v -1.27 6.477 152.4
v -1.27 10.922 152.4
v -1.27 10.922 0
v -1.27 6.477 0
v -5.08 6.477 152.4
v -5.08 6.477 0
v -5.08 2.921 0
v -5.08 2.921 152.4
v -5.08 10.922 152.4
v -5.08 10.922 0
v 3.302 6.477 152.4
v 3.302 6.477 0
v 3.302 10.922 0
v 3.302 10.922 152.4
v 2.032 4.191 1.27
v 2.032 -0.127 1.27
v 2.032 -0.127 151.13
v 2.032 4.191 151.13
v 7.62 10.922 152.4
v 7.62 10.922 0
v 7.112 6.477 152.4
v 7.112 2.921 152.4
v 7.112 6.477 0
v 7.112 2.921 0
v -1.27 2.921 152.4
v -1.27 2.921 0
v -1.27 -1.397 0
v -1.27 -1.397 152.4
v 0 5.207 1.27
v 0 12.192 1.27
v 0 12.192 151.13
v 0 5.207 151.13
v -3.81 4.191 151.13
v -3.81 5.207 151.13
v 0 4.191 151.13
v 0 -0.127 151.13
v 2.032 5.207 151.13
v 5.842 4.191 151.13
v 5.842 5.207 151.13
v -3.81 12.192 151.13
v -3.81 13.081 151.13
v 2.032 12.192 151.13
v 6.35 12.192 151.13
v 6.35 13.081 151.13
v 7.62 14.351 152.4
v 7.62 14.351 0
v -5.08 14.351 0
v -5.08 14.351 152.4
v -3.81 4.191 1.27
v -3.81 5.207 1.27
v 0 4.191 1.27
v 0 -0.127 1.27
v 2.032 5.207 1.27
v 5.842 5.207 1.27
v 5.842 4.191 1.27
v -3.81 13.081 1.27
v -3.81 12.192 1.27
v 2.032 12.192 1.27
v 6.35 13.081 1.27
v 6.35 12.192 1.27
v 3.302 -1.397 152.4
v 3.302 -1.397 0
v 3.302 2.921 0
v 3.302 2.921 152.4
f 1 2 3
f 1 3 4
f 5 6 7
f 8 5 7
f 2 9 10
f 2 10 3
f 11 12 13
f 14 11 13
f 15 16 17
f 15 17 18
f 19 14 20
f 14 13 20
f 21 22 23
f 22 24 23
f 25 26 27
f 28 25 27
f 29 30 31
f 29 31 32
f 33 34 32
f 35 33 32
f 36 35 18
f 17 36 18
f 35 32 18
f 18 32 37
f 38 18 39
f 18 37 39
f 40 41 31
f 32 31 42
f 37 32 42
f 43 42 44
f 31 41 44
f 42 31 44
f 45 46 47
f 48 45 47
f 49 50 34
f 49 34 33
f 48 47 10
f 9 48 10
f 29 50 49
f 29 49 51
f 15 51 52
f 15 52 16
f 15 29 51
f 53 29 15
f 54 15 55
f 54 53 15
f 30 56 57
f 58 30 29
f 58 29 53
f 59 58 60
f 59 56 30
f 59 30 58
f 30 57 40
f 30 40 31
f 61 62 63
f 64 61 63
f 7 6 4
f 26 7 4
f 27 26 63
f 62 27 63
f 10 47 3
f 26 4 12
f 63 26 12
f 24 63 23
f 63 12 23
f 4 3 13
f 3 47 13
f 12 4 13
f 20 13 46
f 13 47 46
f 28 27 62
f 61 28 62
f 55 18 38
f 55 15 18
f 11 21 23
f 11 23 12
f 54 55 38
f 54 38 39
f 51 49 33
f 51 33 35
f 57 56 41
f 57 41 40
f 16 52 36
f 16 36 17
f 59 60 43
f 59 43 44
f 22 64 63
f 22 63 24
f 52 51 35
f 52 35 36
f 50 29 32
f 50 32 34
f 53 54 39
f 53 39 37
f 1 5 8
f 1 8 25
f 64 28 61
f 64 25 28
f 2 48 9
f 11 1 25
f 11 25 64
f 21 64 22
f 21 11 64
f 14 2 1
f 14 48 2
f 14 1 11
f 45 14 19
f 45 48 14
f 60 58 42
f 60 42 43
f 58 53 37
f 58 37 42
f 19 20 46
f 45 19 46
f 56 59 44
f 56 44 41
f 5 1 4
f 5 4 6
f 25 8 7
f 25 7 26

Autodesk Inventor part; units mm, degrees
ref_plane "YZ Plane" through (0, 0, 0) normal (1, 0, 0) x (0, 1, 0)
ref_plane "XZ Plane" through (0, 0, 0) normal (0, 1, 0) x (-1, 0, 0)
ref_plane "XY Plane" through (0, 0, 0) normal (0, 0, 1) x (1, 0, 0)
sketch "Sketch1" plane through (0, 0, 0) normal (0, 0, 1) x (1, 0, 0)
  point P0 (0, 0)
sketch "Sketch2" plane through (0, 0, 0) normal (0, 0, 1) x (1, 0, 0)
  point P0 (0, 0)
sketch "Sketch3" plane through (0, 0, 0) normal (0, 0, 1) x (1, 0, 0)
  line L0 (7.62, 10.922) -> (7.62, 14.351)
  line L1 (7.62, 14.351) -> (-5.08, 14.351)
  line L2 (-5.08, 14.351) -> (-5.08, 10.922)
  line L3 (-5.08, 10.922) -> (-1.27, 10.922)
  line L4 (-1.27, 10.922) -> (-1.27, 6.477)
  line L5 (-1.27, 6.477) -> (-5.08, 6.477)
  line L6 (-5.08, 6.477) -> (-5.08, 2.921)
  line L7 (-5.08, 2.921) -> (-1.27, 2.921)
  line L8 (-1.27, 2.921) -> (-1.27, -1.397)
  line L9 (-1.27, -1.397) -> (3.302, -1.397)
  line L10 (3.302, -1.397) -> (3.302, 2.921)
  line L11 (3.302, 2.921) -> (7.112, 2.921)
  line L12 (7.112, 2.921) -> (7.112, 6.477)
  line L13 (7.112, 6.477) -> (3.302, 6.477)
  line L14 (3.302, 6.477) -> (3.302, 10.922)
  line L15 (3.302, 10.922) -> (7.62, 10.922)
  point P0 (0, 0)
  dimension "d6" = 3.429
  dimension "d7" = 12.7
  dimension "d9" = 3.429
  dimension "d12" = 3.81
  dimension "d13" = 4.445
  dimension "d14" = 3.556
  dimension "d15" = 4.572
  dimension "d16" = 4.318
  dimension "d17" = 3.556
  dimension "d21" = 4.318
extrude "Extrusion1" add sketch "Sketch3" along normal blind 152.4
shell "Shell1" thickness 1.27 removed faces 0
properties part number "RIPnewslide2"
